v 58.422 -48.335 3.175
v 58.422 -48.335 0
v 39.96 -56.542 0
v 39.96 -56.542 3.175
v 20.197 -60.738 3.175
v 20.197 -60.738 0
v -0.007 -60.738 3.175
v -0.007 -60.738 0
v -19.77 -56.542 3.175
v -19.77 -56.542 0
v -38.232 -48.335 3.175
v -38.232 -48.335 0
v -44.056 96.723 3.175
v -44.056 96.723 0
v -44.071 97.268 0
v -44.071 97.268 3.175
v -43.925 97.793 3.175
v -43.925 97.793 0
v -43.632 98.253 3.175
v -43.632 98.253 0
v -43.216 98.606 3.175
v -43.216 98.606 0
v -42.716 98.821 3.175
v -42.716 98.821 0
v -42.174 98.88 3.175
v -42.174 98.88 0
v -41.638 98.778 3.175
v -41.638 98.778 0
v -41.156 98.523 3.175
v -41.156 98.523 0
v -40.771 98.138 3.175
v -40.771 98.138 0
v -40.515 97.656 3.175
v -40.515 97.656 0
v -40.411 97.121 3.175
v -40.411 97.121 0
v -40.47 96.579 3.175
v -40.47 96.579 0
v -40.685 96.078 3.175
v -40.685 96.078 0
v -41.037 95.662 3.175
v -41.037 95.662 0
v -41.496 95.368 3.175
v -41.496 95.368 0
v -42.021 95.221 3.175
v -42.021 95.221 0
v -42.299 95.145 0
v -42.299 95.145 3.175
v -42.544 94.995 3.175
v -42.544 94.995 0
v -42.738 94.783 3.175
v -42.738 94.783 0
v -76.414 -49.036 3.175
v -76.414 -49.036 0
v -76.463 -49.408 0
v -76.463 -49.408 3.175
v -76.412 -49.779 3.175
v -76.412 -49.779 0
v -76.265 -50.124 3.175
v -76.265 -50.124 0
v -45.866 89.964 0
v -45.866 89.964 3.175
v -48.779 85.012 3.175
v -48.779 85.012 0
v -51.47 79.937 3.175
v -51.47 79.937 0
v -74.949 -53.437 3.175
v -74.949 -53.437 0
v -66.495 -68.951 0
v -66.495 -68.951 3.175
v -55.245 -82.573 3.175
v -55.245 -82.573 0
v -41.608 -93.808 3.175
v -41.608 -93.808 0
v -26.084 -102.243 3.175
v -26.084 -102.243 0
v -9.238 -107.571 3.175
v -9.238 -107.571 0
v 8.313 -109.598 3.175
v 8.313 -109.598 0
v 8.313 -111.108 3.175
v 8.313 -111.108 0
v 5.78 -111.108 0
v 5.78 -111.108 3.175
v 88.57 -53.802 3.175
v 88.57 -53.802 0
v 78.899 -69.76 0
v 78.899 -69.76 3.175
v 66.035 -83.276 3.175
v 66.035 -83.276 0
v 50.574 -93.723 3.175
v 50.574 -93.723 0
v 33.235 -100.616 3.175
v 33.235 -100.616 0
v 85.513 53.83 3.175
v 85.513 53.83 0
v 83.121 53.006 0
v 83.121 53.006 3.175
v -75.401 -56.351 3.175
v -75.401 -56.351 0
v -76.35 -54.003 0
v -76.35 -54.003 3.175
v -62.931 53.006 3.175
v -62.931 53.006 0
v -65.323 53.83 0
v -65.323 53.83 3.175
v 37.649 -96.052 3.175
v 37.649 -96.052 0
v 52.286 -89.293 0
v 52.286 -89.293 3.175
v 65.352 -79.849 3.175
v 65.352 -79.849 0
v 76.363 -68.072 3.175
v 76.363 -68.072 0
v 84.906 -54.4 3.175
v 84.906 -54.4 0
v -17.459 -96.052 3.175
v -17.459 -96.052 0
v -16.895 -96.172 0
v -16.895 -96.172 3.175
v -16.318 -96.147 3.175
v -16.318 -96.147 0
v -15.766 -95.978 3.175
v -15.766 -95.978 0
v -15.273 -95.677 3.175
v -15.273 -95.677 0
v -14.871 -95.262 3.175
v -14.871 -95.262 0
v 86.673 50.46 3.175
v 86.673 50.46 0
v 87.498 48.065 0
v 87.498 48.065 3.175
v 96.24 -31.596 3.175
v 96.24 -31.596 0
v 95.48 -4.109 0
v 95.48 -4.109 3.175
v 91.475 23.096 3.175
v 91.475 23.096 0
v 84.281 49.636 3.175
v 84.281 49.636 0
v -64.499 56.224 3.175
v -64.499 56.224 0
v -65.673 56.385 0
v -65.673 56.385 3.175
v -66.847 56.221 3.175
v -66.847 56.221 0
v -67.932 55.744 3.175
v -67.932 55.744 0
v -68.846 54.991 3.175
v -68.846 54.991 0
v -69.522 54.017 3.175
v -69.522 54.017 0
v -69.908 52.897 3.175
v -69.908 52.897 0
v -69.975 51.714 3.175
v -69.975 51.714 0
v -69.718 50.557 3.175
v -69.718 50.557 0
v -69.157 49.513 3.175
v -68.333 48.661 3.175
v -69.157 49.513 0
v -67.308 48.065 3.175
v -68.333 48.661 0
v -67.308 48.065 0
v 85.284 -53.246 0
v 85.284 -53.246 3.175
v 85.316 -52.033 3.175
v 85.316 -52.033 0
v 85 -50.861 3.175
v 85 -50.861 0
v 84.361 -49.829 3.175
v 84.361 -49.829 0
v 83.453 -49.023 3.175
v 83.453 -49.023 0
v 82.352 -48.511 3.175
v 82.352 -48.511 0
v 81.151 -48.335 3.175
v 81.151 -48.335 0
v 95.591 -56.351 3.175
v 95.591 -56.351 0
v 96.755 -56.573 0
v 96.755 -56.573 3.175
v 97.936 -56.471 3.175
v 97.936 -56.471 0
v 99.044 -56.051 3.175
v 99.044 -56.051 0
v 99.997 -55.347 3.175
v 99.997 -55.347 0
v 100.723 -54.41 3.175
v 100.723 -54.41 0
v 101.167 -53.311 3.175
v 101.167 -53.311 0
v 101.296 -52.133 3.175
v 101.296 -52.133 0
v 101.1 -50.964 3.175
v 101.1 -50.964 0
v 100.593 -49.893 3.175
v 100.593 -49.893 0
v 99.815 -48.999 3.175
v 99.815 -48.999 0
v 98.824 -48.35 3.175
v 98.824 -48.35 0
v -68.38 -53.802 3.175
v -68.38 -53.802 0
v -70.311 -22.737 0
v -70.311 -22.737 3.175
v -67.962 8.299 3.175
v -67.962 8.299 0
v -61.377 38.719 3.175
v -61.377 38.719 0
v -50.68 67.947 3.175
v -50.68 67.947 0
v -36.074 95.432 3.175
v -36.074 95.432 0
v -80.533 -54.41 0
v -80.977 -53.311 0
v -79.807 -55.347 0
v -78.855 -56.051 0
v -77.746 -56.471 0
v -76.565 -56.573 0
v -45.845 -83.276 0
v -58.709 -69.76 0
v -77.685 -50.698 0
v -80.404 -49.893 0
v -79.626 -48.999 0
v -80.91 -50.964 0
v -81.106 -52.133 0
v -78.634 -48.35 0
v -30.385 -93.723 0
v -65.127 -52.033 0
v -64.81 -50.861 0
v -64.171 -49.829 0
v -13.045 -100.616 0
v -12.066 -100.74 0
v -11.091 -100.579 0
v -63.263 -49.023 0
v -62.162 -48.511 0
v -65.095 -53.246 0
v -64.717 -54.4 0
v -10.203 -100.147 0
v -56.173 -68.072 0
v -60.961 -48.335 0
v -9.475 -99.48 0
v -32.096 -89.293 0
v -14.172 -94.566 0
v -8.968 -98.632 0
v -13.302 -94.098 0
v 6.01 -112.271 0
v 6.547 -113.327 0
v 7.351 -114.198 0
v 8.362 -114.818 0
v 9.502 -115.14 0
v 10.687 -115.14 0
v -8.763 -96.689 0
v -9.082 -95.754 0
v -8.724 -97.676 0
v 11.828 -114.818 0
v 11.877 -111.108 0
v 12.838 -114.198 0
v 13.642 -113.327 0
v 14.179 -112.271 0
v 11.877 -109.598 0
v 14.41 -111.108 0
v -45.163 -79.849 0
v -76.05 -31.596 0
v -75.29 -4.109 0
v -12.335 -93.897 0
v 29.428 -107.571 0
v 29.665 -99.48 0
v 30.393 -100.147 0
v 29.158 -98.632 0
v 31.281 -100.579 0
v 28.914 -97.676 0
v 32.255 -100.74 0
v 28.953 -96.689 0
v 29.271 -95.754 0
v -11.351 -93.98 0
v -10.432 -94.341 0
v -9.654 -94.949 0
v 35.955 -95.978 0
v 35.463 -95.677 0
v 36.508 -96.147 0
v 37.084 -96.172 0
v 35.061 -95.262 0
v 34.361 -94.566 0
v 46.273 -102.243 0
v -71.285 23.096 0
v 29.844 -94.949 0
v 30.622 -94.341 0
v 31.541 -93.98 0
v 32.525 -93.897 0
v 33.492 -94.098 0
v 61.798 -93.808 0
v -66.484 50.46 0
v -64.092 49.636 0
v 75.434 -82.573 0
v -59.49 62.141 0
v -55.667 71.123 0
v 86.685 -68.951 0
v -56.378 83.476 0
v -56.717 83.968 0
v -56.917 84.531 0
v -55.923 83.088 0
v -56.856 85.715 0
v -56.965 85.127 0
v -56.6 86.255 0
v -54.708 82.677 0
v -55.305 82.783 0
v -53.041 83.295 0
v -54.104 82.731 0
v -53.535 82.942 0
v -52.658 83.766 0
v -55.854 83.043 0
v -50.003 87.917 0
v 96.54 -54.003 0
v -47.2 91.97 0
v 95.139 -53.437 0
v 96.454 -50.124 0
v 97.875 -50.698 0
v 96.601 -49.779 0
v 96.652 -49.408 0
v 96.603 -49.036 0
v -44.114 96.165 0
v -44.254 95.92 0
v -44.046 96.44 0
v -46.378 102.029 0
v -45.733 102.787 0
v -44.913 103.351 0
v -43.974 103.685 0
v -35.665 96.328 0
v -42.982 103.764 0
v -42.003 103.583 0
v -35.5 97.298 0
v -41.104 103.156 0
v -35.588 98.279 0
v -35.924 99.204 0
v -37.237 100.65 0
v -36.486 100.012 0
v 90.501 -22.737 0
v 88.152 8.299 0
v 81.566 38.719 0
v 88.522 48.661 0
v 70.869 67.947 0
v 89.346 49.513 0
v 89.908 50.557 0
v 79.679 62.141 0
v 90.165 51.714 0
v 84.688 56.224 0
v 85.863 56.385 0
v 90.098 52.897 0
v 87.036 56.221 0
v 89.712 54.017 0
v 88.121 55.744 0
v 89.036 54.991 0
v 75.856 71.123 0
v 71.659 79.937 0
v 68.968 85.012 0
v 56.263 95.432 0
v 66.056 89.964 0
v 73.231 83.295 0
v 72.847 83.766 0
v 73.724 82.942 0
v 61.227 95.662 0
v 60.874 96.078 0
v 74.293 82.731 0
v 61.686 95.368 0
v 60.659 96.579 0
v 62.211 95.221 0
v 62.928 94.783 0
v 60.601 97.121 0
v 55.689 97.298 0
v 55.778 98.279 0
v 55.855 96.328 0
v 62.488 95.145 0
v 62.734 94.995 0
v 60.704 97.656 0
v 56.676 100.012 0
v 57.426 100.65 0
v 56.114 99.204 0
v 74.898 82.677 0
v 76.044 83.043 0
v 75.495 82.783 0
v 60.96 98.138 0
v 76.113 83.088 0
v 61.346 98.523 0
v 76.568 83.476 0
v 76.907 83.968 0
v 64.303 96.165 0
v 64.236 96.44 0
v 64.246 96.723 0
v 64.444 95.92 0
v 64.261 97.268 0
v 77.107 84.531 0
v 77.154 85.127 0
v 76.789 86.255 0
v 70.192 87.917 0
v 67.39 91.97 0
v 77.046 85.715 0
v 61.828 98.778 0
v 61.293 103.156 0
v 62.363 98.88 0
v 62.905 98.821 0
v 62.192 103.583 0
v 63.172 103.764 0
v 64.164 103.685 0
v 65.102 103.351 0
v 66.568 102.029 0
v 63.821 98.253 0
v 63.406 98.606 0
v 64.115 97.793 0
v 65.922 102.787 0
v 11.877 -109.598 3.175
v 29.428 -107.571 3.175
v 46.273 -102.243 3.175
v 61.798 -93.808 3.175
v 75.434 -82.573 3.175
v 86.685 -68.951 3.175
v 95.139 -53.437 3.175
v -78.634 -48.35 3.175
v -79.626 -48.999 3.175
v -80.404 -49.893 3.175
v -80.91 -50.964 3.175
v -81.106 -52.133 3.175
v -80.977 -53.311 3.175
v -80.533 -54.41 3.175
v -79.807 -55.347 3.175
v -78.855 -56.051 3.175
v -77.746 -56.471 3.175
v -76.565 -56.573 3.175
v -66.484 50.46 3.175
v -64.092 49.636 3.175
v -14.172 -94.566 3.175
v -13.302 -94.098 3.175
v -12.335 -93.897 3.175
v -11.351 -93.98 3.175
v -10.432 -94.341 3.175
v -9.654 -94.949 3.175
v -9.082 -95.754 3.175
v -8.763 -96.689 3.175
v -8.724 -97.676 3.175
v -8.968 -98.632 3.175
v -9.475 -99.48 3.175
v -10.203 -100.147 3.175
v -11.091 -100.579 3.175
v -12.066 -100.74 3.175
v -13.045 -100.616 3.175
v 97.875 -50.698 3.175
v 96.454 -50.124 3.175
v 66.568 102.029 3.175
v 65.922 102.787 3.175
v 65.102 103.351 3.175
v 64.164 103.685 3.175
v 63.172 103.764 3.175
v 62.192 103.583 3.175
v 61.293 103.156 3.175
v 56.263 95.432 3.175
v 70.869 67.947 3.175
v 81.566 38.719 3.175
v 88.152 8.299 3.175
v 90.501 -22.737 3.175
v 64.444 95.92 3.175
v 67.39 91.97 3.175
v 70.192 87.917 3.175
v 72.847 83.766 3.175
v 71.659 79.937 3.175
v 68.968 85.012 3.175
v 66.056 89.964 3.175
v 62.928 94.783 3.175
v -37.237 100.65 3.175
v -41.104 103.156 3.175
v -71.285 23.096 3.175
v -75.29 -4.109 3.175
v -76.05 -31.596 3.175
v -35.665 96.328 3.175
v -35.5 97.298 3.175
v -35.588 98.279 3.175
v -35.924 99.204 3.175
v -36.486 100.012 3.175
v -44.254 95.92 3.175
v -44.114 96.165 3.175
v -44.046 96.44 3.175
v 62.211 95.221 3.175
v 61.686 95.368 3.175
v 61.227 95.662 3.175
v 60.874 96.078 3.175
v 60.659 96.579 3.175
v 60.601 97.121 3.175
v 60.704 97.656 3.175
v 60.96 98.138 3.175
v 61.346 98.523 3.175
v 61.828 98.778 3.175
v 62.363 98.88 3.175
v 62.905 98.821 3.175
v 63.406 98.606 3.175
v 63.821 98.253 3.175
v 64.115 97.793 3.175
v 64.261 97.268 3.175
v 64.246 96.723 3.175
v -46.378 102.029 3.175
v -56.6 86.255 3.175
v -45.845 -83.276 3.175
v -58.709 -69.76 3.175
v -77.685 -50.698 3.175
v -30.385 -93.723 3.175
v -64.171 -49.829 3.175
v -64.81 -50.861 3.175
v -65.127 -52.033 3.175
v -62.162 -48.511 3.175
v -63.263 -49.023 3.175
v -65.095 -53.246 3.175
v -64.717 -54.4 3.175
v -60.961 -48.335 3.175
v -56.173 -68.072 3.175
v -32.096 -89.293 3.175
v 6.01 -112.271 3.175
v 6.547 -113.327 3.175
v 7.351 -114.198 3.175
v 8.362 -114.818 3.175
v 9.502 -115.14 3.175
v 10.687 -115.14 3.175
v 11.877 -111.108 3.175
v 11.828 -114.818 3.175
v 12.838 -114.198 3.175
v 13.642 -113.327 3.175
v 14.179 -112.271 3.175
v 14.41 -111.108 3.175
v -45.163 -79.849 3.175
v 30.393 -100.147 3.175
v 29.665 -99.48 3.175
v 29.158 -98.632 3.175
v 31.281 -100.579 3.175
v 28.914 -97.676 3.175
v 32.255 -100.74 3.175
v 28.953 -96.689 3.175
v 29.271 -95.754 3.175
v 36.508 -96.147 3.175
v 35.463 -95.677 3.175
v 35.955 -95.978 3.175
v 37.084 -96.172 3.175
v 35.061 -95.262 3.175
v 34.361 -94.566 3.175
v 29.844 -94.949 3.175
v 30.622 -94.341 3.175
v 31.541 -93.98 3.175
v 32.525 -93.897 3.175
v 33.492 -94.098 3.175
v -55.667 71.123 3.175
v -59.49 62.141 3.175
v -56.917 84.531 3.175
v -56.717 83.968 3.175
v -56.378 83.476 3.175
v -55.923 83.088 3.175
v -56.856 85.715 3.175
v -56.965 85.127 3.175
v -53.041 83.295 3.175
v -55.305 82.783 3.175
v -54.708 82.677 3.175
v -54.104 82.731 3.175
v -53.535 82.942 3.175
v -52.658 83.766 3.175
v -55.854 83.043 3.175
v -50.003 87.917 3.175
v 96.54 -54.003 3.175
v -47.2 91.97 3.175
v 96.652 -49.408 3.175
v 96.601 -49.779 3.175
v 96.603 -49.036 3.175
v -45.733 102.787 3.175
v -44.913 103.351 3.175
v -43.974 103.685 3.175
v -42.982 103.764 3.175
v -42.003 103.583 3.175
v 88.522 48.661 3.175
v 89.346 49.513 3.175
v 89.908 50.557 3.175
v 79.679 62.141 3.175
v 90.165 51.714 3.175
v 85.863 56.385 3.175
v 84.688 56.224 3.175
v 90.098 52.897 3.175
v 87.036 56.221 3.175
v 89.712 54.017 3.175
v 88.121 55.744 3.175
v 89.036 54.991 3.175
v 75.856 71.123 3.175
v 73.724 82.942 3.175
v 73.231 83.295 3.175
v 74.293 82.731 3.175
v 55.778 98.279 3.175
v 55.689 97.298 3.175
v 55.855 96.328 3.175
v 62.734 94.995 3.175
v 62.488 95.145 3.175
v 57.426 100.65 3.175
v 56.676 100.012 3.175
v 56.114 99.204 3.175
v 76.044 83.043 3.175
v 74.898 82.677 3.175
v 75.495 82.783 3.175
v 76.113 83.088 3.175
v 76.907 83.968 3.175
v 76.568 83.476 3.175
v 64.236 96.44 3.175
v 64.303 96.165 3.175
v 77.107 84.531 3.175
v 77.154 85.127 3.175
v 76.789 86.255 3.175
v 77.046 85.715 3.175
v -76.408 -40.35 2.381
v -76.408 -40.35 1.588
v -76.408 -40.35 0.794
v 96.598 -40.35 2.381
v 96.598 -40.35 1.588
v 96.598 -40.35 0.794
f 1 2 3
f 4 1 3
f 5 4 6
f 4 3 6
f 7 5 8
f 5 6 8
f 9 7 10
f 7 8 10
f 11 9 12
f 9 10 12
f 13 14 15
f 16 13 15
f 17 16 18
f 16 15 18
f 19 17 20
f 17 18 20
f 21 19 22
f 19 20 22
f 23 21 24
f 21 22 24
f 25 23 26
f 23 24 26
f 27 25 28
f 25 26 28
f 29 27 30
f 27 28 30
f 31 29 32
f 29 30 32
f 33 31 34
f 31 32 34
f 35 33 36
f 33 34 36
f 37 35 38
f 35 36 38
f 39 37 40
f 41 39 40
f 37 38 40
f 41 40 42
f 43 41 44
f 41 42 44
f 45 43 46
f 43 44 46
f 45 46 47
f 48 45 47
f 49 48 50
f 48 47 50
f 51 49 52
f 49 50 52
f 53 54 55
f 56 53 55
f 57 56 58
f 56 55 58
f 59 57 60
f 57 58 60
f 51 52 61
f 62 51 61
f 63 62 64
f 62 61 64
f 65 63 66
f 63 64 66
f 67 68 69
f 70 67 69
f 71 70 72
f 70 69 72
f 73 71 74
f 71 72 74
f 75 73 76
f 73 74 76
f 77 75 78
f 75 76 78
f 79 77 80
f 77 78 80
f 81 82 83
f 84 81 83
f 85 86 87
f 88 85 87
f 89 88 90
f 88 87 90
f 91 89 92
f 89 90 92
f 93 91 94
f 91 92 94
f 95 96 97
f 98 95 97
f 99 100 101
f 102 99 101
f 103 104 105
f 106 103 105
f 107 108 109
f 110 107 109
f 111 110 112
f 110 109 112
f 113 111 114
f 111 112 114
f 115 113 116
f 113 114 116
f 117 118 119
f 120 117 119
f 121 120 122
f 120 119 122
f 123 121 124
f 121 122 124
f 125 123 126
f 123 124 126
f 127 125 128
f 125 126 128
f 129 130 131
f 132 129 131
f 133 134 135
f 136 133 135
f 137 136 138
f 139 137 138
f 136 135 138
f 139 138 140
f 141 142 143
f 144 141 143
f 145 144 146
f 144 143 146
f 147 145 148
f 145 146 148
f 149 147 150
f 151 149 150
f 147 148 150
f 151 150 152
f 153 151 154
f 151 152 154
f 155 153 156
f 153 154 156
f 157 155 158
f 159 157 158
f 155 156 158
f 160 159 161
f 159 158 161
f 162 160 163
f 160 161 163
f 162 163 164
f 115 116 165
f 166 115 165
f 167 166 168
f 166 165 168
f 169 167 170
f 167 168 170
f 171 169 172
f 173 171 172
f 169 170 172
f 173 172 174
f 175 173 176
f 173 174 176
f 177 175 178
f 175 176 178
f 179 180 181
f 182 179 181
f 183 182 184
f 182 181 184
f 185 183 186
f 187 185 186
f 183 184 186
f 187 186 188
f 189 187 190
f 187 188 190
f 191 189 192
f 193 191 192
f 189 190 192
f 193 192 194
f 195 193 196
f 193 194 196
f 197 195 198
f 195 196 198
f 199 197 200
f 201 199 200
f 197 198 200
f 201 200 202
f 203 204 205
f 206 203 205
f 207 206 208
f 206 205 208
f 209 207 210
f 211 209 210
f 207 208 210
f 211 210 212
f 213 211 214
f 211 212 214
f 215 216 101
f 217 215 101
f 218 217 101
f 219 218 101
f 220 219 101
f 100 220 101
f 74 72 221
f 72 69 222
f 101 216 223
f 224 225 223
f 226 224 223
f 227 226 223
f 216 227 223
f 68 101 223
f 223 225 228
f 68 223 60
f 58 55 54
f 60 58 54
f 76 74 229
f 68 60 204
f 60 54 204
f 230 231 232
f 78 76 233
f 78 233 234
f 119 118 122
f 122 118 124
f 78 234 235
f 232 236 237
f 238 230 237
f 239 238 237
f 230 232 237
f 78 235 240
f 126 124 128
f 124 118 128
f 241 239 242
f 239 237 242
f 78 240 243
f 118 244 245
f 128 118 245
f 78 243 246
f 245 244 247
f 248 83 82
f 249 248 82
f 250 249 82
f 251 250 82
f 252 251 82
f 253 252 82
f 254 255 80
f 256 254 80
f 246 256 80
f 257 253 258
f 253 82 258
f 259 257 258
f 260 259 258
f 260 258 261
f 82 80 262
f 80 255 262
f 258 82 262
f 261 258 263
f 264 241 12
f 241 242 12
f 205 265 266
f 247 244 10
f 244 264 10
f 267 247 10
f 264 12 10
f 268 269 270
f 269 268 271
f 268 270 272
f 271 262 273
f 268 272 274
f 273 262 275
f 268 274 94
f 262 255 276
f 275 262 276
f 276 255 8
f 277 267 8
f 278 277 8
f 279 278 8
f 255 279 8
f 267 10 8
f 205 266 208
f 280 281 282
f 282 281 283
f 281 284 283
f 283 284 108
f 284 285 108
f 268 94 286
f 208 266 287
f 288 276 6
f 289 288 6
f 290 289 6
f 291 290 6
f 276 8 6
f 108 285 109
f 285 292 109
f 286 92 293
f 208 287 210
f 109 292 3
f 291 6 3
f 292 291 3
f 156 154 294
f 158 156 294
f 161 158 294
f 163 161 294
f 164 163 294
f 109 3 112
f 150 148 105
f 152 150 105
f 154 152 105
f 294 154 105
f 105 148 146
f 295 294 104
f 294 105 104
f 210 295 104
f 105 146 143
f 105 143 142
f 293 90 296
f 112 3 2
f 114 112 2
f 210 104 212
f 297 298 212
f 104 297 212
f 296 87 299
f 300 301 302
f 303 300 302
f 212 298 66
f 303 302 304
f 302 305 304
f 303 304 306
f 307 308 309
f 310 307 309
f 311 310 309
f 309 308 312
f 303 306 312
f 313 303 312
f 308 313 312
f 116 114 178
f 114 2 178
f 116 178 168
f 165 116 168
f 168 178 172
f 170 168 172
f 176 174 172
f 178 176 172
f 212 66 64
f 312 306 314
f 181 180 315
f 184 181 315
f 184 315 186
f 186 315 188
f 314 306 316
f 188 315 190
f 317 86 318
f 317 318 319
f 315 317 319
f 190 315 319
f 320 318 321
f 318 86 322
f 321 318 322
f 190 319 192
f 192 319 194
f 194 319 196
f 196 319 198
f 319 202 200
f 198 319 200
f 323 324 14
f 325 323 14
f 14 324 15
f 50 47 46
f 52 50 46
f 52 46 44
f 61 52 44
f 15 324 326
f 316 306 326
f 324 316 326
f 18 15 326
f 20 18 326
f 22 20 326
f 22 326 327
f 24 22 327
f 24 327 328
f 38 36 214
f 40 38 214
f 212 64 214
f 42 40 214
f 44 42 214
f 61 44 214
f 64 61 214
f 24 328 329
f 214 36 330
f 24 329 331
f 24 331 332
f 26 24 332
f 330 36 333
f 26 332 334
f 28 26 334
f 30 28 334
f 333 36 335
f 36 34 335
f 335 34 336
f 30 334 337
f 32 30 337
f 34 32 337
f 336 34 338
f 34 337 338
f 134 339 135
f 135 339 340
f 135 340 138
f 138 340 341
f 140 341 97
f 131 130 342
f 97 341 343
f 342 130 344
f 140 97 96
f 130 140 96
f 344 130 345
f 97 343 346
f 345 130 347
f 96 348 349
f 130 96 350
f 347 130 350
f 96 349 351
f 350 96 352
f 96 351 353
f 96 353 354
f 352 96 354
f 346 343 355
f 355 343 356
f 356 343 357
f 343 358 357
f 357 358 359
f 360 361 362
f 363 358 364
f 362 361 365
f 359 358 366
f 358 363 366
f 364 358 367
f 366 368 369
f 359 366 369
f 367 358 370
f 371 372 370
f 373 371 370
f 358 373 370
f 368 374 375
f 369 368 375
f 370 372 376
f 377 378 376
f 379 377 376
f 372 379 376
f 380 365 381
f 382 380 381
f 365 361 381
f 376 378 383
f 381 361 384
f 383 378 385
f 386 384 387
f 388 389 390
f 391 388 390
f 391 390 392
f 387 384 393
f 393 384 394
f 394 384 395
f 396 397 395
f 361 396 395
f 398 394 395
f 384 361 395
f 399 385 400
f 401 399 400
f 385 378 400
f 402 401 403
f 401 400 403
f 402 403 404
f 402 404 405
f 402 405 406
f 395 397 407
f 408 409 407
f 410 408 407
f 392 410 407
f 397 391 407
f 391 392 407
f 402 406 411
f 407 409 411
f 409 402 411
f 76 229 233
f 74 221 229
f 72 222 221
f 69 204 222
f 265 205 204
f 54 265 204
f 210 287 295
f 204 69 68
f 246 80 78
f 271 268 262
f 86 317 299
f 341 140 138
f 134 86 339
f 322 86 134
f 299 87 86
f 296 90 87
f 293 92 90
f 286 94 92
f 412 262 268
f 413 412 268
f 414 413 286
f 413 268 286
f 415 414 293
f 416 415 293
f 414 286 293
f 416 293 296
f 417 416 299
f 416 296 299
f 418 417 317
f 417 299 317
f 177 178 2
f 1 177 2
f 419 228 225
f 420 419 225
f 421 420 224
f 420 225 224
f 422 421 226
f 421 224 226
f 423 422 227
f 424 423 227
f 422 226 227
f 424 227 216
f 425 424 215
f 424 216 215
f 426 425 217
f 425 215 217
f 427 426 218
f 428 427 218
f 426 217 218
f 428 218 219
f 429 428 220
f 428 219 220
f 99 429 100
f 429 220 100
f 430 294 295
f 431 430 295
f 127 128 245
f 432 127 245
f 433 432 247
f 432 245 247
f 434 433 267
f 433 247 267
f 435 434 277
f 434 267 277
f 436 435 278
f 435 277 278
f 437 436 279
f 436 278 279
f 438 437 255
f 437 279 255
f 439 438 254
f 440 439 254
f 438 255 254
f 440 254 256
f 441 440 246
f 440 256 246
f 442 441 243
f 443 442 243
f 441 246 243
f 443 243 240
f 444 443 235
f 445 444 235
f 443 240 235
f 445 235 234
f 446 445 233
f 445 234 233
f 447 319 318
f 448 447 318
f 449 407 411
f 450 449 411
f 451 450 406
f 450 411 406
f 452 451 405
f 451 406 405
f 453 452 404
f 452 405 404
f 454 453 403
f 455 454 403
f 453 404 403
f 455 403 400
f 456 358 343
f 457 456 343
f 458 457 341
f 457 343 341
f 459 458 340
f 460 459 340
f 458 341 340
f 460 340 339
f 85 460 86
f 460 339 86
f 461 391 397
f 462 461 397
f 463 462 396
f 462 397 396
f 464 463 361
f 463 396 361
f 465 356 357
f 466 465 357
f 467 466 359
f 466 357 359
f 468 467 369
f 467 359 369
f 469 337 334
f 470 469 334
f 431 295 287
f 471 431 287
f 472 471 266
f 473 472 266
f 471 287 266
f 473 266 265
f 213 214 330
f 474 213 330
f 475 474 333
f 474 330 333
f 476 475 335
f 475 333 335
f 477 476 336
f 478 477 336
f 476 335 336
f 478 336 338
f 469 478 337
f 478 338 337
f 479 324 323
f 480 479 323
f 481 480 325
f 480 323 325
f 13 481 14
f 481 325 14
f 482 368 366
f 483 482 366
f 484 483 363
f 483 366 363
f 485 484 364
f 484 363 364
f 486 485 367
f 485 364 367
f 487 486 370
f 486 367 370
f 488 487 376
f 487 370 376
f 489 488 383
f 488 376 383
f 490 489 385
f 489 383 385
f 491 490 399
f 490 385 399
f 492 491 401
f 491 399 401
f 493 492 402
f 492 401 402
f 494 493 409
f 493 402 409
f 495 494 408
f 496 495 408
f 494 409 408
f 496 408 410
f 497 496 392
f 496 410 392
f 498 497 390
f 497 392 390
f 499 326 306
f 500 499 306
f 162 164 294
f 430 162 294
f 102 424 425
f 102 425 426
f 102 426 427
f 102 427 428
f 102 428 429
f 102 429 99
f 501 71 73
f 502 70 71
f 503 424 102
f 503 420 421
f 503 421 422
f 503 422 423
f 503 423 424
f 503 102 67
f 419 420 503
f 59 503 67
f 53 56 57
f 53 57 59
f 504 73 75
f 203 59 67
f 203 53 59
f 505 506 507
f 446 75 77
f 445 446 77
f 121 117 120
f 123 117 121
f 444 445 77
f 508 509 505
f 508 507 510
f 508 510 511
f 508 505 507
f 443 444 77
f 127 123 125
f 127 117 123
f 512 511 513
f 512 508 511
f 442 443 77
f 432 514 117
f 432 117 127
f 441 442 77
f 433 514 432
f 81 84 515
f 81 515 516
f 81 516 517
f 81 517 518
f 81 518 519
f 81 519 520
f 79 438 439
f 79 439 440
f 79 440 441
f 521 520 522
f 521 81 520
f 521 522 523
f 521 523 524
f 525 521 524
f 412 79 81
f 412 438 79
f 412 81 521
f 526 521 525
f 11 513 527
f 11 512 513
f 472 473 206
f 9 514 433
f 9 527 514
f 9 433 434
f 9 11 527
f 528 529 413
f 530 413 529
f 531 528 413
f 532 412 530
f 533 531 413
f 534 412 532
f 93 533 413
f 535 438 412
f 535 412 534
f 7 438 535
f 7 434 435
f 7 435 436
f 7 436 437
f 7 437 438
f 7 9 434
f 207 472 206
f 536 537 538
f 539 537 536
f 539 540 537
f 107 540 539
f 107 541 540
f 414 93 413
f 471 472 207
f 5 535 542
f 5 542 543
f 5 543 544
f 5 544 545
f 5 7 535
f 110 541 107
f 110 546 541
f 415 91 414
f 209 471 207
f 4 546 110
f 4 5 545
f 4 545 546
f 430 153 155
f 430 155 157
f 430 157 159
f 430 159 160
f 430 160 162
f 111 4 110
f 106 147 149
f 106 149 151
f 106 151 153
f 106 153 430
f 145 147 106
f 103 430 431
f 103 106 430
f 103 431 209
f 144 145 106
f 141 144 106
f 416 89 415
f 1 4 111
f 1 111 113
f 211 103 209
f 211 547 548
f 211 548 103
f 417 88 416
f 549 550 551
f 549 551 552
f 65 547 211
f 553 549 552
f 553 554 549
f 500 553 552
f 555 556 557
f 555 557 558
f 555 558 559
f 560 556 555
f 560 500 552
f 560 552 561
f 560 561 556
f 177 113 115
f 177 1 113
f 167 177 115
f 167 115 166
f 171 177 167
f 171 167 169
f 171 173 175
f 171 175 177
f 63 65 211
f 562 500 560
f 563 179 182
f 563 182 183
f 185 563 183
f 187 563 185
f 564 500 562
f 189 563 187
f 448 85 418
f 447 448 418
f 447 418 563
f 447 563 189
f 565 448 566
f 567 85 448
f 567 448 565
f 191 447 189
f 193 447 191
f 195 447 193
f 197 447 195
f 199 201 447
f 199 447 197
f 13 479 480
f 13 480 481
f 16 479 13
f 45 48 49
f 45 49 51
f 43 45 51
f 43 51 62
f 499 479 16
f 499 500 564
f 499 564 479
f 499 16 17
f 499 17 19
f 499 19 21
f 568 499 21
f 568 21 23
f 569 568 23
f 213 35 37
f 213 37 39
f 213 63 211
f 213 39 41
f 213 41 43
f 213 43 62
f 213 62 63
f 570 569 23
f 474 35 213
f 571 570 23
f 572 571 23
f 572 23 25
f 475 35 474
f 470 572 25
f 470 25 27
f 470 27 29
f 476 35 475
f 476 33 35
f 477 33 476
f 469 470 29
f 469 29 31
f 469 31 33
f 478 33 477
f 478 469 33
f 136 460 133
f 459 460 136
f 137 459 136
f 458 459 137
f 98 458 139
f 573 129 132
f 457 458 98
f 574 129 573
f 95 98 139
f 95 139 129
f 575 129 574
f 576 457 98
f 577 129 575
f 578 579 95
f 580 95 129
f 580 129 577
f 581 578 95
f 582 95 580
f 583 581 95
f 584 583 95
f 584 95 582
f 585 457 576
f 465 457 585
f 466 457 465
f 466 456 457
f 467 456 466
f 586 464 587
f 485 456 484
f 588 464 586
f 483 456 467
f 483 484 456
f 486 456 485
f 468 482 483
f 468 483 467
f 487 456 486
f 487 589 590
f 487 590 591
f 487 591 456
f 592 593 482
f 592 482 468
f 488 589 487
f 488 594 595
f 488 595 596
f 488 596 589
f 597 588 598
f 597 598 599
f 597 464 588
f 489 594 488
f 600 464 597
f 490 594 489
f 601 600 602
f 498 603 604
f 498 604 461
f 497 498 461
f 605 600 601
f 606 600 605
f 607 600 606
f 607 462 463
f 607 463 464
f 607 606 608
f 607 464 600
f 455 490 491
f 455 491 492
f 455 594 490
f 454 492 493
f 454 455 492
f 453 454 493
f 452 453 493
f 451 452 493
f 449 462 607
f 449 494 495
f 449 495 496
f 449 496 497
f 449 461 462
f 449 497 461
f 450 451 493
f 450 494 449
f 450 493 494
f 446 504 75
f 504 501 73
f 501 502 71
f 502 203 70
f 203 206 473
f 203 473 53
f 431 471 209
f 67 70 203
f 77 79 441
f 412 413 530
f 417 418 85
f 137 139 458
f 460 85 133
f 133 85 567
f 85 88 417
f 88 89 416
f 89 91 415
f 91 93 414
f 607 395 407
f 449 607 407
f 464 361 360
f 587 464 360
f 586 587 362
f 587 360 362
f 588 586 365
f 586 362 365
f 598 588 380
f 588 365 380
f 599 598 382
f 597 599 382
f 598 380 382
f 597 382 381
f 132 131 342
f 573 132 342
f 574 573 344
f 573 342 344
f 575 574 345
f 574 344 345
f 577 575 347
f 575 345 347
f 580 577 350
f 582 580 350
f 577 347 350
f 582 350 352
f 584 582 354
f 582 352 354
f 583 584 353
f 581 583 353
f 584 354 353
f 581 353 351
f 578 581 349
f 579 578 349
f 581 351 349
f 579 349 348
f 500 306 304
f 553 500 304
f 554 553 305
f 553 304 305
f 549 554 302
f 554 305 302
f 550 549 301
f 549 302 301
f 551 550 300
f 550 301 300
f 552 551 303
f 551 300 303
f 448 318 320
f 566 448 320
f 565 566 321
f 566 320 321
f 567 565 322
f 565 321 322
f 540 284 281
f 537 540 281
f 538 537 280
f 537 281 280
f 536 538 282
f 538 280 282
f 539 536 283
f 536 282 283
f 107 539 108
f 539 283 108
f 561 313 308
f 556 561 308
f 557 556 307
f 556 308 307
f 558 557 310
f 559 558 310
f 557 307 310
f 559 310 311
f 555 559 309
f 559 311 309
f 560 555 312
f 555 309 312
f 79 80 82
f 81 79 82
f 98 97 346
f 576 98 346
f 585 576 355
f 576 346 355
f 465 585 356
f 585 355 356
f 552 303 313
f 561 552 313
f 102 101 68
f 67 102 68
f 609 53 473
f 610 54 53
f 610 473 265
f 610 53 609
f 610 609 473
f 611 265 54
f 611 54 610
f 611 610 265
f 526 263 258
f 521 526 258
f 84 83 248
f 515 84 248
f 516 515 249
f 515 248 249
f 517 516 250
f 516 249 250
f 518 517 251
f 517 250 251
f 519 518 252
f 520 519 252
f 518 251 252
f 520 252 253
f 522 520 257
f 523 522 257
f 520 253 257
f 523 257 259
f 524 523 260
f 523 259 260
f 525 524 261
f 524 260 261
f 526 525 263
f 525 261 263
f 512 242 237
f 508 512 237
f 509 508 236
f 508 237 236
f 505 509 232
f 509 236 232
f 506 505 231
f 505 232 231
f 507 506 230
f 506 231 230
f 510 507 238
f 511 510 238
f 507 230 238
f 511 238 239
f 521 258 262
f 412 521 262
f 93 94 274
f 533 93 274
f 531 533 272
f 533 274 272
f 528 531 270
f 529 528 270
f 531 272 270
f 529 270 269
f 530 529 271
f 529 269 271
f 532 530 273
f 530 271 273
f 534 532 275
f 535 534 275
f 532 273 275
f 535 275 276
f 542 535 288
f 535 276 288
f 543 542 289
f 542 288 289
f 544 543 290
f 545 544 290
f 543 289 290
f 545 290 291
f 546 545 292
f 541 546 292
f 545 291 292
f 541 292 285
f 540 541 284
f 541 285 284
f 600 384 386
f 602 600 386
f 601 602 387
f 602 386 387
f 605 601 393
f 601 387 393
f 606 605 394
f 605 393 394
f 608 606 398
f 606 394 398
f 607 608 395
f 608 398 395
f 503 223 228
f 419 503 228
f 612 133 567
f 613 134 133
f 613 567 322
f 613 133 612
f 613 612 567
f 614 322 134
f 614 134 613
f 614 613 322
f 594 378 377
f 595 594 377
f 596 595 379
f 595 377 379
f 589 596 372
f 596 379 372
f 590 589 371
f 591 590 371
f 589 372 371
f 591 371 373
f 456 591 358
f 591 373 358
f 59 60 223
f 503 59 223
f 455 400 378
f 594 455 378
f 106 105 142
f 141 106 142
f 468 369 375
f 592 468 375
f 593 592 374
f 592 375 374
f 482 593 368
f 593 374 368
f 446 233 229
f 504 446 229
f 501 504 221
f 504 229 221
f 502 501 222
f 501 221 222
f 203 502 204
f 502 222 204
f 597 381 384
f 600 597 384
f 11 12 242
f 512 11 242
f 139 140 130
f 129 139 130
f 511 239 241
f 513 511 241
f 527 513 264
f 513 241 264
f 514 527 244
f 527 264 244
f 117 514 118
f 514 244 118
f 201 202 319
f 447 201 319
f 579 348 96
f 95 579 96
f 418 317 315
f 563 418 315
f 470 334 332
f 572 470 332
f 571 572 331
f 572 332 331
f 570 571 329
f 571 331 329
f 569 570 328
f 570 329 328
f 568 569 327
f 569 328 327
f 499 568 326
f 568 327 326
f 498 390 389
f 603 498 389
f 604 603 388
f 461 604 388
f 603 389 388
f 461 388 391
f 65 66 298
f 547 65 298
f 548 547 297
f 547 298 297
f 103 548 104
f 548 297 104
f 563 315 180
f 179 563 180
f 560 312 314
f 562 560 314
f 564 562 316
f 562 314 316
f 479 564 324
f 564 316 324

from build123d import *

# Parameters (mm, degrees)
BOSS_EXTRUDE1_DEPTH = 3.175


with BuildPart() as part:
    # Sketch1 → Boss-Extrude1 (new body)
    with BuildSketch(Plane.XY):
        with BuildLine():
            Line((-38.232117525, -48.334989908), (-60.961358056, -48.334989908))
            ThreePointArc((-60.961358056, -48.334989908), (-64.527927466, -50.321470228), (-64.71669447, -54.399568858))
            ThreePointArc((-64.71669447, -54.399568858), (-45.162805162, -79.848709383), (-17.459350628, -96.051547015))
            ThreePointArc((-17.459350628, -96.051547015), (-16.036418216, -96.080038848), (-14.87146367, -95.262463569))
            ThreePointArc((-14.87146367, -95.262463569), (-8.888558673, -96.210030714), (-13.045252985, -100.616268123))
            ThreePointArc((-13.045252985, -100.616268123), (-45.845334299, -83.275759663), (-68.380015164, -53.801589172))
            ThreePointArc((-68.380015164, -53.801589172), (-65.192805425, 23.622083996), (-36.073719239, 95.431987857))
            ThreePointArc((-36.073719239, 95.431987857), (-35.587957482, 98.278797412), (-37.236596684, 100.64993172))
            Line((-37.236596684, 100.64993172), (-41.103624033, 103.155671407))
            ThreePointArc((-41.103624033, 103.155671407), (-43.974377986, 103.684742176), (-46.378417101, 102.028922117))
            Line((-46.378417101, 102.028922117), (-56.599560294, 86.254961047))
            ThreePointArc((-56.599560294, 86.254961047), (-56.917224028, 84.531308043), (-55.923039481, 83.087879135))
            Line((-55.923039481, 83.087879135), (-55.853863949, 83.043055072))
            ThreePointArc((-55.853863949, 83.043055072), (-54.103522344, 82.73125901), (-52.657612543, 83.765791448))
            ThreePointArc((-52.657612543, 83.765791448), (-48.619561631, 89.956003624), (-44.25417952, 95.919896729))
            ThreePointArc((-44.25417952, 95.919896729), (-44.070317424, 96.300411286), (-44.056473461, 96.722791379))
            ThreePointArc((-44.056473461, 96.722791379), (-41.15632655, 98.522939289), (-42.02094997, 95.220847385))
            ThreePointArc((-42.02094997, 95.220847385), (-42.426877037, 95.079143581), (-42.7383511, 94.782764332))
            ThreePointArc((-42.7383511, 94.782764332), (-47.349935461, 87.504452643), (-51.469836467, 79.936959858))
            ThreePointArc((-51.469836467, 79.936959858), (-57.625378953, 66.65222576), (-62.931273284, 53.005894799))
            Line((-62.931273284, 53.005894799), (-65.323416618, 53.829575804))
            Line((-65.323416618, 53.829575804), (-64.498829719, 56.224350047))
            ThreePointArc((-64.498829719, 56.224350047), (-69.753703666, 53.470378819), (-67.308320476, 48.064996429))
            Line((-67.308320476, 48.064996429), (-66.483733576, 50.459770671))
            Line((-66.483733576, 50.459770671), (-64.091590242, 49.636089666))
            ThreePointArc((-64.091590242, 49.636089666), (-73.69068183, 9.552817578), (-76.050385999, -31.596217123))
            add(Edge.make_bspline(
                [(-76.413674196, -49.035912557), (-76.490697688, -47.59159519), (-76.544524485, -44.699239364), (-76.422918165, -40.352613355), (-76.213699928, -35.991352831), (-76.089673965, -33.05979149), (-76.050385999, -31.596217123)],
                knots=[0.05307402, 0.05307402, 0.05307402, 0.05307402, 0.290327129, 0.527580238, 0.764833347, 1.002086455, 1.002086455, 1.002086455, 1.002086455], degree=3))
            ThreePointArc((-76.413674196, -49.035912557), (-76.449546072, -49.595209625), (-76.264758395, -50.124315962))
            Line((-76.264758395, -50.124315962), (-77.685109529, -50.698175071))
            Line((-77.685109529, -50.698175071), (-78.633899161, -48.349838327))
            ThreePointArc((-78.633899161, -48.349838327), (-80.793035183, -53.875794296), (-75.401231139, -56.350972449))
            Line((-75.401231139, -56.350972449), (-76.350020771, -54.002635705))
            Line((-76.350020771, -54.002635705), (-74.949113638, -53.436632483))
            ThreePointArc((-74.949113638, -53.436632483), (-41.608142422, -93.807518365), (8.312838811, -109.597528539))
            Line((8.312838811, -109.597528539), (8.312838811, -111.108455553))
            Line((8.312838811, -111.108455553), (5.780076045, -111.108455553))
            ThreePointArc((5.780076045, -111.108455553), (10.094826611, -115.180431153), (14.409577176, -111.108455553))
            Line((14.409577176, -111.108455553), (11.876814411, -111.108455553))
            Line((11.876814411, -111.108455553), (11.876814411, -109.597528539))
            ThreePointArc((11.876814411, -109.597528539), (61.797795644, -93.807518365), (95.138766859, -53.436632483))
            Line((95.138766859, -53.436632483), (96.539673992, -54.002635705))
            Line((96.539673992, -54.002635705), (95.590884361, -56.350972449))
            ThreePointArc((95.590884361, -56.350972449), (100.982688404, -53.875794296), (98.823552382, -48.349838327))
            Line((98.823552382, -48.349838327), (97.874762751, -50.698175071))
            Line((97.874762751, -50.698175071), (96.454411616, -50.124315962))
            ThreePointArc((96.454411616, -50.124315962), (96.639199294, -49.595209625), (96.603327418, -49.035912557))
            add(Edge.make_bspline(
                [(96.240039221, -31.596217123), (96.279327187, -33.05979149), (96.40335315, -35.991352831), (96.612571387, -40.352613355), (96.734177707, -44.699239364), (96.68035091, -47.59159519), (96.603327418, -49.035912557)],
                knots=[0.051381708, 0.051381708, 0.051381708, 0.051381708, 0.288634817, 0.525887926, 0.763141035, 1.000394144, 1.000394144, 1.000394144, 1.000394144], degree=3))
            ThreePointArc((96.240039221, -31.596217123), (93.880335052, 9.552817578), (84.281243464, 49.636089666))
            Line((84.281243464, 49.636089666), (86.673386798, 50.459770671))
            Line((86.673386798, 50.459770671), (87.497973697, 48.064996429))
            ThreePointArc((87.497973697, 48.064996429), (89.943356888, 53.470378819), (84.68848294, 56.224350047))
            Line((84.68848294, 56.224350047), (85.513069839, 53.829575804))
            Line((85.513069839, 53.829575804), (83.120926505, 53.005894799))
            ThreePointArc((83.120926505, 53.005894799), (77.815032175, 66.65222576), (71.659489689, 79.936959858))
            ThreePointArc((71.659489689, 79.936959858), (67.539588683, 87.504452643), (62.928004321, 94.782764332))
            ThreePointArc((62.928004321, 94.782764332), (62.616530258, 95.079143581), (62.210603192, 95.220847385))
            ThreePointArc((62.210603192, 95.220847385), (61.345979772, 98.522939289), (64.246126683, 96.722791379))
            ThreePointArc((64.246126683, 96.722791379), (64.259970645, 96.300411286), (64.443832742, 95.919896729))
            ThreePointArc((64.443832742, 95.919896729), (68.809214853, 89.956003624), (72.847265765, 83.765791448))
            ThreePointArc((72.847265765, 83.765791448), (74.293175566, 82.73125901), (76.04351717, 83.043055072))
            Line((76.04351717, 83.043055072), (76.112692703, 83.087879135))
            ThreePointArc((76.112692703, 83.087879135), (77.10687725, 84.531308043), (76.789213515, 86.254961047))
            Line((76.789213515, 86.254961047), (66.568070323, 102.028922117))
            ThreePointArc((66.568070323, 102.028922117), (64.164031207, 103.684742176), (61.293277254, 103.155671407))
            Line((61.293277254, 103.155671407), (57.426249905, 100.64993172))
            ThreePointArc((57.426249905, 100.64993172), (55.777610703, 98.278797412), (56.26337246, 95.431987857))
            ThreePointArc((56.26337246, 95.431987857), (85.382458646, 23.622083996), (88.569668386, -53.801589172))
            ThreePointArc((88.569668386, -53.801589172), (66.03498752, -83.275759663), (33.234906206, -100.616268123))
            ThreePointArc((33.234906206, -100.616268123), (29.078211895, -96.210030714), (35.061116892, -95.262463569))
            ThreePointArc((35.061116892, -95.262463569), (36.226071438, -96.080038848), (37.649003849, -96.051547015))
            ThreePointArc((37.649003849, -96.051547015), (65.352458384, -79.848709383), (84.906347691, -54.399568858))
            ThreePointArc((84.906347691, -54.399568858), (84.717580687, -50.321470228), (81.151011278, -48.334989908))
            Line((81.151011278, -48.334989908), (58.421770747, -48.334989908))
            ThreePointArc((58.421770747, -48.334989908), (10.094826611, -61.266217935), (-38.232117525, -48.334989908))
        make_face()
    extrude(amount=BOSS_EXTRUDE1_DEPTH)


solid = part.part
